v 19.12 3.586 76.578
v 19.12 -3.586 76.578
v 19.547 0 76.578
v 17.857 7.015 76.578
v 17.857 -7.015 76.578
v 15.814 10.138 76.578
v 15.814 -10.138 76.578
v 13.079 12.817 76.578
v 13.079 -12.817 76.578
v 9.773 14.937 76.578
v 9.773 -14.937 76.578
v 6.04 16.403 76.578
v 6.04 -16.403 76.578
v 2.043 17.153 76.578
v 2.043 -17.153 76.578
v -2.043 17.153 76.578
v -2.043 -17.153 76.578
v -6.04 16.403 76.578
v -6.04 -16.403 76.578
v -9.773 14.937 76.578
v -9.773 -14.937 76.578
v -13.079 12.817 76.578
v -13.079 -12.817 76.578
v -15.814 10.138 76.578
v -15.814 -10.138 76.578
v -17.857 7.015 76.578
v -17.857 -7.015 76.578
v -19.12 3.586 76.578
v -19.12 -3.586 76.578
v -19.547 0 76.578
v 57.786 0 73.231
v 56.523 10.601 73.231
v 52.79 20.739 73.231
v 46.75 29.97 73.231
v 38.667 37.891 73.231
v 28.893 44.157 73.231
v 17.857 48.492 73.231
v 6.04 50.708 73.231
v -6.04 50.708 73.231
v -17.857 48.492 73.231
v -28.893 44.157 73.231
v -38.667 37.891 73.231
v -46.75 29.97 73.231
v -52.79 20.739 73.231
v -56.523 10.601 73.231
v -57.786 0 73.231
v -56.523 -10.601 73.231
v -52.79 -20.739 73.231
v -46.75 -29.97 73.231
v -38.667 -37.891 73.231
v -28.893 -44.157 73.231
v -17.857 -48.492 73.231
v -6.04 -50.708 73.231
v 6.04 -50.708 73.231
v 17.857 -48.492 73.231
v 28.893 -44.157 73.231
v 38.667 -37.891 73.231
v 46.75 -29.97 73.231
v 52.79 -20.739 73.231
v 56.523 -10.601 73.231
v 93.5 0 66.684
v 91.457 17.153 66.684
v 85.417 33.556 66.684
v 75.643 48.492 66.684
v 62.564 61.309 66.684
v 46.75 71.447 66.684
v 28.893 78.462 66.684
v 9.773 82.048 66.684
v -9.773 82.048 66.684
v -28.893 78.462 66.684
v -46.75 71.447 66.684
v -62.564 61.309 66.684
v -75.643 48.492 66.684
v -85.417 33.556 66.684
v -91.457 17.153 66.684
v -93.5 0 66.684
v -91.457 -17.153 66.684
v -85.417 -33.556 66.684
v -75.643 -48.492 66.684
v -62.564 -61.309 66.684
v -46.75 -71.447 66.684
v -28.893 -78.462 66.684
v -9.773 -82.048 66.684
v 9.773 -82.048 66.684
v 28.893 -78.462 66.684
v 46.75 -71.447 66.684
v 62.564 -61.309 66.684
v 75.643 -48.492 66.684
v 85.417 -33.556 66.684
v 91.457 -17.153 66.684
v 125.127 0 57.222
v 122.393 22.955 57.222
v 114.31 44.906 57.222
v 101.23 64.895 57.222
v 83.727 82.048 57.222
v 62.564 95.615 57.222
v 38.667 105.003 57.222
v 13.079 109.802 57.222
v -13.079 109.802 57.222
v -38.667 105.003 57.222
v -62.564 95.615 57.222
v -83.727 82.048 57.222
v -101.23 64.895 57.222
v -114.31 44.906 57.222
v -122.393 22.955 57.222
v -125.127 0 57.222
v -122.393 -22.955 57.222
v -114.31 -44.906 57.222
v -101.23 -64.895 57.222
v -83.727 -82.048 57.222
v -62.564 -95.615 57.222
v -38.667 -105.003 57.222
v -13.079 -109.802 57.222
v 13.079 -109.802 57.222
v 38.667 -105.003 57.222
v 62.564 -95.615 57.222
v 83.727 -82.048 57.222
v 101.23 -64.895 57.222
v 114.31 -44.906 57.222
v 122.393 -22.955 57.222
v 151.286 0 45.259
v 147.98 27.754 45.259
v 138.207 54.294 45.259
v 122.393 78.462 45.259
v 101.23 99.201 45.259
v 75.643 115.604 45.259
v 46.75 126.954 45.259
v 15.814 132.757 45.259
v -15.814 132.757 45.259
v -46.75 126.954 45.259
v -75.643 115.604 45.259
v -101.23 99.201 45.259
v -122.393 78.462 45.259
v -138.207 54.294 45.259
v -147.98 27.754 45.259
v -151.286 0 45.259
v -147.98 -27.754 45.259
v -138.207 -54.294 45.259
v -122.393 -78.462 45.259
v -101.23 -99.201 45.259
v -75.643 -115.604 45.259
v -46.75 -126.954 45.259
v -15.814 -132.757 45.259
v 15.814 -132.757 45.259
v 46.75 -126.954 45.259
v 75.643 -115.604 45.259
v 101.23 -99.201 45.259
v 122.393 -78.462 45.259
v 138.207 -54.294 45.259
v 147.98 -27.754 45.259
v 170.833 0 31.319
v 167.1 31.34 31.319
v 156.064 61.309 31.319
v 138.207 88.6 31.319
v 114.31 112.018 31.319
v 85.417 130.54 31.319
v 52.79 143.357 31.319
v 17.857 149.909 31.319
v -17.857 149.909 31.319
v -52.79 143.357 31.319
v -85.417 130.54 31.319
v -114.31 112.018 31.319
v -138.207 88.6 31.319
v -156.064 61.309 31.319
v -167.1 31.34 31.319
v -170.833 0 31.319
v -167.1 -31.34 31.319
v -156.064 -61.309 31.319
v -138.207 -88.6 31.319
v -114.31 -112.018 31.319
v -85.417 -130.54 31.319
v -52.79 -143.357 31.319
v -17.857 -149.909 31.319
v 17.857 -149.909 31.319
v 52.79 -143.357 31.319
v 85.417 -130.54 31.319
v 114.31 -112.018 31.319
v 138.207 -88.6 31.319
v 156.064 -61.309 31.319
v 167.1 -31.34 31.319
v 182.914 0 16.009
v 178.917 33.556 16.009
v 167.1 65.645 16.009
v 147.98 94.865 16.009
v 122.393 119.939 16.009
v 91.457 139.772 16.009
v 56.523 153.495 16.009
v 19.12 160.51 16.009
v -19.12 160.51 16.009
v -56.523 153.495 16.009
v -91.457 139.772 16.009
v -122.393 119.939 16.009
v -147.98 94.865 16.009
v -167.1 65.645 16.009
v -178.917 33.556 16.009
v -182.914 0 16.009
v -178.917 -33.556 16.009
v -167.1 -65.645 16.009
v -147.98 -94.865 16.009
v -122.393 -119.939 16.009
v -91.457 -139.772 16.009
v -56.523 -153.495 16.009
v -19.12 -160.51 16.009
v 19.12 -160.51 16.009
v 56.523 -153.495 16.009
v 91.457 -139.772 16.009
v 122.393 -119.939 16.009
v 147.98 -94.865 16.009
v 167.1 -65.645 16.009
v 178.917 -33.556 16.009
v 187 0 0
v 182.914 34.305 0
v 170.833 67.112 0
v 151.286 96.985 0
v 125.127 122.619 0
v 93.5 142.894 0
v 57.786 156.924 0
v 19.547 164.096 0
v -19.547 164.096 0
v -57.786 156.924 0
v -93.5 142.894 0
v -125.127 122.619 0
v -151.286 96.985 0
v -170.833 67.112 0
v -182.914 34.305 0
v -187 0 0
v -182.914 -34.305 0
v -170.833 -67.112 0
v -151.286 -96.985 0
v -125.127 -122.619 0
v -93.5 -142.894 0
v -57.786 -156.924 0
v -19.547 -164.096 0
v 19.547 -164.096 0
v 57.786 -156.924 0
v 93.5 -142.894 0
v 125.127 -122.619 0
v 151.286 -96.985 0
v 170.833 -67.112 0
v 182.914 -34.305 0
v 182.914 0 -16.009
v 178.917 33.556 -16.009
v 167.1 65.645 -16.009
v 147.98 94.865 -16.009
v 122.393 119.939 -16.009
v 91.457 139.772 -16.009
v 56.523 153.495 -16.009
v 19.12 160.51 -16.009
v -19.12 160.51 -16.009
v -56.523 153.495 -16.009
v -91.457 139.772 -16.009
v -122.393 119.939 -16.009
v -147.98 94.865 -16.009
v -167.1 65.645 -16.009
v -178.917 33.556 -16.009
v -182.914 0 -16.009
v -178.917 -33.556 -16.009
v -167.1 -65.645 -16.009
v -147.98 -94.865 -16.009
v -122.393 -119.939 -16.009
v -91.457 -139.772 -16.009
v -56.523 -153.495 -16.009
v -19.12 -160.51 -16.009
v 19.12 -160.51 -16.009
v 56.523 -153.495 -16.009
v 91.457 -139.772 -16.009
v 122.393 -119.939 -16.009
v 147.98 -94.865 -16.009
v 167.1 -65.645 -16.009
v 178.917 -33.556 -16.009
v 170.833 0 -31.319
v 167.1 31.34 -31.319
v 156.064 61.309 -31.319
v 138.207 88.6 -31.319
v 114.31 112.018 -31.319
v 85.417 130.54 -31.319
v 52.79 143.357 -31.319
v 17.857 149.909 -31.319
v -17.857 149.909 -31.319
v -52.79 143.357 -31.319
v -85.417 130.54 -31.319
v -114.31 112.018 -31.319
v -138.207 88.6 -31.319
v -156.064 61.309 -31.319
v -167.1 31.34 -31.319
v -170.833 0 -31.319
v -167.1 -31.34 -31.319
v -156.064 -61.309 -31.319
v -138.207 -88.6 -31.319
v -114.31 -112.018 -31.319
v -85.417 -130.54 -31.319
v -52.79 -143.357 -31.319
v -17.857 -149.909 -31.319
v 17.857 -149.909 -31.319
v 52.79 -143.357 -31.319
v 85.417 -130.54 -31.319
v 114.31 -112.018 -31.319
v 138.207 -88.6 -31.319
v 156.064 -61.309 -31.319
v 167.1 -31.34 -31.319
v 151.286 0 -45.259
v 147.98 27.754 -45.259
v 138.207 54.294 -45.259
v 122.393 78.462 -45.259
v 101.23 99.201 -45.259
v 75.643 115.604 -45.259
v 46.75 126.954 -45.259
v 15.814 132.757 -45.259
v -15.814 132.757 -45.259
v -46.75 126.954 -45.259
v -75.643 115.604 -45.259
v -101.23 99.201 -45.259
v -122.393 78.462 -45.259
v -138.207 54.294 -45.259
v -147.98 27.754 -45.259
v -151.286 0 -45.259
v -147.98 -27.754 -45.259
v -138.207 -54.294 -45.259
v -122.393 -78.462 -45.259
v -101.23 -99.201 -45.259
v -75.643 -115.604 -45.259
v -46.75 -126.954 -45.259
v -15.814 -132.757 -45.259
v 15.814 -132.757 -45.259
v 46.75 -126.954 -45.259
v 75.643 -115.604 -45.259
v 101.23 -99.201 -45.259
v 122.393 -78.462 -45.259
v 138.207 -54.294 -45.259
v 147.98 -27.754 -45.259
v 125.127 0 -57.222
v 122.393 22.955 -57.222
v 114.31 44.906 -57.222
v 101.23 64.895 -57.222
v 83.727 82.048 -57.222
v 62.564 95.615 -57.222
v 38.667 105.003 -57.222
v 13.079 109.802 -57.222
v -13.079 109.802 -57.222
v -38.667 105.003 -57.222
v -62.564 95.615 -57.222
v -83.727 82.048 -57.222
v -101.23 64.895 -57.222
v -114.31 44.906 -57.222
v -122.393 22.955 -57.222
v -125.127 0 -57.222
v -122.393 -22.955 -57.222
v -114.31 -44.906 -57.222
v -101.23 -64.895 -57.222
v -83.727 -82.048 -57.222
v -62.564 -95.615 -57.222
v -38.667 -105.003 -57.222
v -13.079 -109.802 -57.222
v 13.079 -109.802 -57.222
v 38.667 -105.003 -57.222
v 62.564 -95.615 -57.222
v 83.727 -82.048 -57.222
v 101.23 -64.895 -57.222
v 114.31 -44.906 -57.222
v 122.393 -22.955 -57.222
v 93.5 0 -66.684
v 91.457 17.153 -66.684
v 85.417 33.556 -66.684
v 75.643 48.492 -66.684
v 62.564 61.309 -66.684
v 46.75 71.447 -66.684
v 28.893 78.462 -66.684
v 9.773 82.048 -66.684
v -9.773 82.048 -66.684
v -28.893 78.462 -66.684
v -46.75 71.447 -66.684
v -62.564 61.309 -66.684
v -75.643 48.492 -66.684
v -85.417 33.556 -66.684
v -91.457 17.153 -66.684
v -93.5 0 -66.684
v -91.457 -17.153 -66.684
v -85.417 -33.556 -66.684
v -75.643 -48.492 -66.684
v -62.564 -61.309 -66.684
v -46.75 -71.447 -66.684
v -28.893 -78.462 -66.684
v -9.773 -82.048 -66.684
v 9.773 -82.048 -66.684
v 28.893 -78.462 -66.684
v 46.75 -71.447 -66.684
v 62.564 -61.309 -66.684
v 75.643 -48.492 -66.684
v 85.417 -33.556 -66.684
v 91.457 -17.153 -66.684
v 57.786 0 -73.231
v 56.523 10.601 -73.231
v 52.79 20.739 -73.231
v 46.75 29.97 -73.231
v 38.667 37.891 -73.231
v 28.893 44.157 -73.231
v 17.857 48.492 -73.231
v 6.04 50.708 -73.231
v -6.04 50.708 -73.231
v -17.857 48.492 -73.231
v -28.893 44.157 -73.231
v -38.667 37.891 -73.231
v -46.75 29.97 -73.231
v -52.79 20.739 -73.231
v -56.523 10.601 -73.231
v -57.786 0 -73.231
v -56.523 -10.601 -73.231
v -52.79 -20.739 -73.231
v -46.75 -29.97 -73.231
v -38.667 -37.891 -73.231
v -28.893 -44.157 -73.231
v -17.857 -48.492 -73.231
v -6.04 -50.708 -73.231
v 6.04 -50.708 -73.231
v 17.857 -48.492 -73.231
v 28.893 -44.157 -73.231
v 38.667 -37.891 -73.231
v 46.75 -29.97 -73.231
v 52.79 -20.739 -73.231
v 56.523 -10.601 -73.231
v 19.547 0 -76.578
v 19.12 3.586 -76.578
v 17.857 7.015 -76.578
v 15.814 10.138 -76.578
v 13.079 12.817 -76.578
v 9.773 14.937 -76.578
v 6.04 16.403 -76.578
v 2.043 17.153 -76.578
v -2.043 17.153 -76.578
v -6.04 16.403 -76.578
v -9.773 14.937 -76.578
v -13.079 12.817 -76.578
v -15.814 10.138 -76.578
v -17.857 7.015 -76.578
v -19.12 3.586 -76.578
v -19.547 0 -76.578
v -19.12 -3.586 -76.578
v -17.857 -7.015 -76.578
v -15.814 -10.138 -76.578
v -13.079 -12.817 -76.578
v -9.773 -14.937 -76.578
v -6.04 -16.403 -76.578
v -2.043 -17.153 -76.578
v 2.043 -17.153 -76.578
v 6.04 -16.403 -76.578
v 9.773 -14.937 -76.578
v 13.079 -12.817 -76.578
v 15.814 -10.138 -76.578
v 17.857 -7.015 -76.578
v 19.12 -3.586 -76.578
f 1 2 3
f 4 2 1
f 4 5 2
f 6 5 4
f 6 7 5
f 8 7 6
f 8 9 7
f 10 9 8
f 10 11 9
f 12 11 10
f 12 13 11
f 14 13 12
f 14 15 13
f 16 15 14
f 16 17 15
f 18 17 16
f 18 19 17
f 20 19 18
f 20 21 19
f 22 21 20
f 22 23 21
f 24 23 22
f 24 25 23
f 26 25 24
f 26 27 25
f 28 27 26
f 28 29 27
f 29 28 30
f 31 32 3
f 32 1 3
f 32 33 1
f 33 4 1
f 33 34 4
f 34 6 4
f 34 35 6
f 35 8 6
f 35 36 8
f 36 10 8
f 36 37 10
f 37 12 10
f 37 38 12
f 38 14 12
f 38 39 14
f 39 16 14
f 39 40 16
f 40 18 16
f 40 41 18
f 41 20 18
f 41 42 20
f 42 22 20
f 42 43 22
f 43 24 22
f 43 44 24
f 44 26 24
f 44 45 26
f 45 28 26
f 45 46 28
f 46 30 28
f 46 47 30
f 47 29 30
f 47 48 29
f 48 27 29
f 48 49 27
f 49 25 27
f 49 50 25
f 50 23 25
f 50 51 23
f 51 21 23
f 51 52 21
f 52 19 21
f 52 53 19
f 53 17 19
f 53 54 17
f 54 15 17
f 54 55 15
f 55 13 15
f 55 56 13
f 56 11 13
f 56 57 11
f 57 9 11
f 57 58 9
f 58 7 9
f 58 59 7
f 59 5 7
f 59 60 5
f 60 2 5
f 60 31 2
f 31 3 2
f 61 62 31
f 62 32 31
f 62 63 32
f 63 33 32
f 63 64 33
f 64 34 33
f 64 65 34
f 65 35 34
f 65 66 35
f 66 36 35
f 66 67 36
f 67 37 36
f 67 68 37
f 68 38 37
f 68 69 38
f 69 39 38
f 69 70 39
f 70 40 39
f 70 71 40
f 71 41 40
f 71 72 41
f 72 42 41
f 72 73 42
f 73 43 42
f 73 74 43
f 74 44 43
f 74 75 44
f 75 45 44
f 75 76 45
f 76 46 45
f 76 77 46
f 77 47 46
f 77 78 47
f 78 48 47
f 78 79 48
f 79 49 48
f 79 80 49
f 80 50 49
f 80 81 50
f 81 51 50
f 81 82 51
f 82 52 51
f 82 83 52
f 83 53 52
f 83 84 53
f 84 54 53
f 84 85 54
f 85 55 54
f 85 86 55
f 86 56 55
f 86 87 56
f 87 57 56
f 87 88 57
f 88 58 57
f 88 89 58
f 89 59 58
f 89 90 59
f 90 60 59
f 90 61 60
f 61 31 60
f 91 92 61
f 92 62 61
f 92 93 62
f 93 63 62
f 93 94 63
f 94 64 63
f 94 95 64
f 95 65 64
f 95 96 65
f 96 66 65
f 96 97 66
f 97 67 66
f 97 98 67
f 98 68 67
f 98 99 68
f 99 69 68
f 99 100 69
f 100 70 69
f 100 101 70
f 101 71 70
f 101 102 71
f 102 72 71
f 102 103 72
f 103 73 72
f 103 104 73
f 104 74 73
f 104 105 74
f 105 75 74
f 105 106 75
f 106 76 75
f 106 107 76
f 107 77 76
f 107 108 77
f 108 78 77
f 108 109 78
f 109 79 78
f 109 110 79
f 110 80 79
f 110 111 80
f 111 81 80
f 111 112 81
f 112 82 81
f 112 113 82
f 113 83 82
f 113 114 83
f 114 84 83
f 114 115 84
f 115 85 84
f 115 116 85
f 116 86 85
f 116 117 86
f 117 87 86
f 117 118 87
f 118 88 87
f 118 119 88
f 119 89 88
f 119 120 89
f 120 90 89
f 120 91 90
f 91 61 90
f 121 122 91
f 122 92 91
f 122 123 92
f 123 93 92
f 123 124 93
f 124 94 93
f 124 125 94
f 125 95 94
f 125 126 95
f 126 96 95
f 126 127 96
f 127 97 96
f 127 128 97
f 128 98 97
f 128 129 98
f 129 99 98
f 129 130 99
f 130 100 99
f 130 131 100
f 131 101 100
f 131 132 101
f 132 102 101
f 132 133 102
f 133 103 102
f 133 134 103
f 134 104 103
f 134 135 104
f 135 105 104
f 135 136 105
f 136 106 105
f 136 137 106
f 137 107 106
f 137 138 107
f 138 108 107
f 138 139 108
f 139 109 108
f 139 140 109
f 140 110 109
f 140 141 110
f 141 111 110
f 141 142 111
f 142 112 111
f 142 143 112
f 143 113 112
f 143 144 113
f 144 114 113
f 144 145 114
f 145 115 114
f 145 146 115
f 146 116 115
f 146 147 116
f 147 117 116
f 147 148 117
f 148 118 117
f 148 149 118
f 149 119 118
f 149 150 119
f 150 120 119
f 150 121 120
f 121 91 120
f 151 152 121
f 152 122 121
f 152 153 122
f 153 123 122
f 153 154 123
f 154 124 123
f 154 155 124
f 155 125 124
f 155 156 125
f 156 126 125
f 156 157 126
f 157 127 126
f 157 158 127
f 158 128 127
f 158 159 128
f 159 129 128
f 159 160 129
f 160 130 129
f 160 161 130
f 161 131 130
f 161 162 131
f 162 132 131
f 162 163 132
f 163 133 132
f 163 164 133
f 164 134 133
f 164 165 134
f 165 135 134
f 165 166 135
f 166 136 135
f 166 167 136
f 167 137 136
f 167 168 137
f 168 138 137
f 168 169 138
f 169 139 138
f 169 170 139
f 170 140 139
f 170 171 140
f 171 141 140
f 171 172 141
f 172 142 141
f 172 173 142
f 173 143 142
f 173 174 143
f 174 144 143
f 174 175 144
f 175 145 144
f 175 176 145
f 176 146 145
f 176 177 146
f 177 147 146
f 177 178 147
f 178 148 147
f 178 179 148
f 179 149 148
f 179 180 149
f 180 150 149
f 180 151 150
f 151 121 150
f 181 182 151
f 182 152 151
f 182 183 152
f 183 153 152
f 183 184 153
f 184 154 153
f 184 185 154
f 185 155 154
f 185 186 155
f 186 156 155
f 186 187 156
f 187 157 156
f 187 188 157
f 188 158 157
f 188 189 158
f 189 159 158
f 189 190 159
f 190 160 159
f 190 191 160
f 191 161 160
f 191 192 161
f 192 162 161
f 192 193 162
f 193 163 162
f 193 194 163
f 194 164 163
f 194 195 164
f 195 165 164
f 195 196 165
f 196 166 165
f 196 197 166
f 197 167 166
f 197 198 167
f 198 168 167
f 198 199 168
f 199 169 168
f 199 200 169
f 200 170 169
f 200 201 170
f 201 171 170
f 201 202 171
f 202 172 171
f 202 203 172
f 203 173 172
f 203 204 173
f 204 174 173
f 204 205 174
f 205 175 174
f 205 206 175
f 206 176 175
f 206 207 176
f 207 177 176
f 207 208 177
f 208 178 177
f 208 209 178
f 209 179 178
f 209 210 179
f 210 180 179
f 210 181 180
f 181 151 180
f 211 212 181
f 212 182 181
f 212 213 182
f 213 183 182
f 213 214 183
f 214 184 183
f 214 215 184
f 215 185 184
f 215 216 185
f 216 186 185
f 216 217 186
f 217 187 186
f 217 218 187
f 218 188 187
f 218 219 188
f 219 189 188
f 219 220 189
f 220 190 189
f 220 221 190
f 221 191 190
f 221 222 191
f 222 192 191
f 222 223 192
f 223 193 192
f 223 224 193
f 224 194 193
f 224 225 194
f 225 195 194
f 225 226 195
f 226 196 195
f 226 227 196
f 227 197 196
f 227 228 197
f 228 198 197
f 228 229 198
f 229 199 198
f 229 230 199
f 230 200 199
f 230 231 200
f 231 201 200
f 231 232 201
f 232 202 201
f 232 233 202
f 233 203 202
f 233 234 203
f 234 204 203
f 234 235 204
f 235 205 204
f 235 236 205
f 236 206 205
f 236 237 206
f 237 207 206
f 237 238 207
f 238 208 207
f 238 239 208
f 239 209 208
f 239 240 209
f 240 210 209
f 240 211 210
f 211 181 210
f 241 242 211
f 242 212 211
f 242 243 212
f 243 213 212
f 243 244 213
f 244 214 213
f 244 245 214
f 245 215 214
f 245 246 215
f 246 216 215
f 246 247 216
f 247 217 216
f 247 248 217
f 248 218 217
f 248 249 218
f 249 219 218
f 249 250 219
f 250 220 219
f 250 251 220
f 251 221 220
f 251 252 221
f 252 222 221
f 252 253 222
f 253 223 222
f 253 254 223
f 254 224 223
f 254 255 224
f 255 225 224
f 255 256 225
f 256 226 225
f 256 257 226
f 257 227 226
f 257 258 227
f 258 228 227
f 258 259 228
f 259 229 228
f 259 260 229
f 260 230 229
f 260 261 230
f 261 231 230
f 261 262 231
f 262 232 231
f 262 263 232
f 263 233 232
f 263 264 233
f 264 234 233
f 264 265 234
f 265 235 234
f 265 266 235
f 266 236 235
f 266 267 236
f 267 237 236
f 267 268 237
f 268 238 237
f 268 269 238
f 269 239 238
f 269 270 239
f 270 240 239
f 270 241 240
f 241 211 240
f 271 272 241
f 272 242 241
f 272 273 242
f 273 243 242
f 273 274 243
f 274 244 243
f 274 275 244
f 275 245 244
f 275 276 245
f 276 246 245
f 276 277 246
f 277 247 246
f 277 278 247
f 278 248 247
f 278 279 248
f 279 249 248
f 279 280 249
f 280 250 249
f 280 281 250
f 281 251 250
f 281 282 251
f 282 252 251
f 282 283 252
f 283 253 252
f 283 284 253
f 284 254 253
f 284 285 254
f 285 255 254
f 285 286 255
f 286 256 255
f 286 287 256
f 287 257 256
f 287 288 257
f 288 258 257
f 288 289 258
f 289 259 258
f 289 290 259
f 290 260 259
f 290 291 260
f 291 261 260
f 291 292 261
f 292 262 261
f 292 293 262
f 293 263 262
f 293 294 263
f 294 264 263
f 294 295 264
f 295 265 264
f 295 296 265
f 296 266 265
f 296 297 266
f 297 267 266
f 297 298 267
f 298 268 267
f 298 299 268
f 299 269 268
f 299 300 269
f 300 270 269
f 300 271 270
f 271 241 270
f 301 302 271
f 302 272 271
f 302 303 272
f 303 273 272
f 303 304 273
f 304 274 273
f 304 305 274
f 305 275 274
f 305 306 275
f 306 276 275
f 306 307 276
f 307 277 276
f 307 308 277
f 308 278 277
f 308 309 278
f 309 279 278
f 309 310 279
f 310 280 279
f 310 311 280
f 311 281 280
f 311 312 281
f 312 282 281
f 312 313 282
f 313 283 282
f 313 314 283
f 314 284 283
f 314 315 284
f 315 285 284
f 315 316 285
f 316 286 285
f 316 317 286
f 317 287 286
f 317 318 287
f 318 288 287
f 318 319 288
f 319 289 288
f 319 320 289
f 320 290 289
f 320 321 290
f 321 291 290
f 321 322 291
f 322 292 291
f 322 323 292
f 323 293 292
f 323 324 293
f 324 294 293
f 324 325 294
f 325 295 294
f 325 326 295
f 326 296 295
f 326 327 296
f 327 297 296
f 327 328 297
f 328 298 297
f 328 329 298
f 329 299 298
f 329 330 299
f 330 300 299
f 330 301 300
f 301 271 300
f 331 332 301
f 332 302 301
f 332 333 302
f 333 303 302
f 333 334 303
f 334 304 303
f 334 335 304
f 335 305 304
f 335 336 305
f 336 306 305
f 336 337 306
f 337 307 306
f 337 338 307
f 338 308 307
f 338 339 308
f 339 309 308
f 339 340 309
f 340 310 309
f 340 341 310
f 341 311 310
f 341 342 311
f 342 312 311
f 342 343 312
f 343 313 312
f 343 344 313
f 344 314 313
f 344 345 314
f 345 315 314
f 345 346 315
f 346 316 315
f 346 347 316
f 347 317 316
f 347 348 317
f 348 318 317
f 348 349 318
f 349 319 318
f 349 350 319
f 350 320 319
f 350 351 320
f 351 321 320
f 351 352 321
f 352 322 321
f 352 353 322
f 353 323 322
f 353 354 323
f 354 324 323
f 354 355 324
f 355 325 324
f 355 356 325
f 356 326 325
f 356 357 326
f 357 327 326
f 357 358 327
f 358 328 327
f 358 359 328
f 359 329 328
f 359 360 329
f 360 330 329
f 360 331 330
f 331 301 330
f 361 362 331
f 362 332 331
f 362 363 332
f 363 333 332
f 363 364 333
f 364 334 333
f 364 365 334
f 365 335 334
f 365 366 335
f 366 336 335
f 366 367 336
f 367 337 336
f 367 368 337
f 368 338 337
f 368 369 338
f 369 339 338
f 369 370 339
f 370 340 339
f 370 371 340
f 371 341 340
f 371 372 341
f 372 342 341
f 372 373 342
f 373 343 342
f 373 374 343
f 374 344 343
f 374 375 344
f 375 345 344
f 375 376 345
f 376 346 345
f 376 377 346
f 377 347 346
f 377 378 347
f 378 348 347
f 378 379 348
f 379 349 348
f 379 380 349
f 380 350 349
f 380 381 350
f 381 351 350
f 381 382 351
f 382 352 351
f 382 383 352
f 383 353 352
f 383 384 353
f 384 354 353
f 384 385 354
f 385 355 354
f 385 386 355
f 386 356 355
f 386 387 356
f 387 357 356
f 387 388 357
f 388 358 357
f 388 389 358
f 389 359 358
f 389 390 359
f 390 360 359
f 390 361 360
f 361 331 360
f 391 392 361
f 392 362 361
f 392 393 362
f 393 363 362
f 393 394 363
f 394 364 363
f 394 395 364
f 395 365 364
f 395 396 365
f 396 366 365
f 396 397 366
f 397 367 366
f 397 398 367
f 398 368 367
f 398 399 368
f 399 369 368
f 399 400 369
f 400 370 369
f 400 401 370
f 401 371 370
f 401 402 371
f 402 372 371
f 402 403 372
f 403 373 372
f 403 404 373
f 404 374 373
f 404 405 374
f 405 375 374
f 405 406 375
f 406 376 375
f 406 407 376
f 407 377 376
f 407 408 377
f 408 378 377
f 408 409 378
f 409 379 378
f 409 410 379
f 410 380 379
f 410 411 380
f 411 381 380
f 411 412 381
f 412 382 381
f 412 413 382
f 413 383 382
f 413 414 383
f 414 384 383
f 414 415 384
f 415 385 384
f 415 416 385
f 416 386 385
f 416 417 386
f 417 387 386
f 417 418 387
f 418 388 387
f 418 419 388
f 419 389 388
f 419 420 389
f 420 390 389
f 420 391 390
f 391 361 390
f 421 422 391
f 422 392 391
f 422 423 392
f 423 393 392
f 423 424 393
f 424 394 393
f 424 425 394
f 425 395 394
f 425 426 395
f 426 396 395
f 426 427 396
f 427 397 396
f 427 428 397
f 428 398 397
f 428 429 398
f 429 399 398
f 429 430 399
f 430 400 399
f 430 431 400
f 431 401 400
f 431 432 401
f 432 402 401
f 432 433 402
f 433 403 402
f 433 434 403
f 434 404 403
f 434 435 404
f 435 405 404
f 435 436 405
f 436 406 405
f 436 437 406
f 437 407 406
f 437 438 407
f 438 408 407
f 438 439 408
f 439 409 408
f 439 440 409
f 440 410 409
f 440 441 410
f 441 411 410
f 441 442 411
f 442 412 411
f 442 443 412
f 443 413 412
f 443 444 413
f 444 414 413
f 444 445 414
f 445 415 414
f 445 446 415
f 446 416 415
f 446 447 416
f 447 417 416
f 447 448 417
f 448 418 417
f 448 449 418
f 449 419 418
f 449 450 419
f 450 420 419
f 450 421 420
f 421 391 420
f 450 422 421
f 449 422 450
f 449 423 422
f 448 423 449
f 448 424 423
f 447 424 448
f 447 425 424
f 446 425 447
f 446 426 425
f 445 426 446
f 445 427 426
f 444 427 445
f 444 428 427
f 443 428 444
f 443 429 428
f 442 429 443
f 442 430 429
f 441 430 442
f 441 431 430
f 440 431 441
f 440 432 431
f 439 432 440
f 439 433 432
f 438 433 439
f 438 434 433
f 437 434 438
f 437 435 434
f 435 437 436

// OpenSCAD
// Generated by SolidPython 1.0.1 on 2020-07-29 00:46:53


scale(v = [17, 15, 7]) {
	sphere(r = 11);
}
/***********************************************
*********      SolidPython code:      **********
************************************************
 
# import packages: SolidPython
from solid import *
from solid.utils import *
from itertools import chain, combinations, permutations


class Resize:

    def __init__(self, scad_file):
        self.scad_file = scad_file
        #self.scad_file = import_scad(scad_file)
        # cone/cylinder param:
        self.r1 = 0
        self.r2 = 0
        self.h = 0
        # rectangular prism param:
        self.w = 0
        self.l = 0
        # ellipse param:
        self.r = 0

    # import OpenScad code (file name corresponds to shape)


    # classify shape + parameters
    def assign(self, param1, param2, param3):
        if self.scad_file == 'cone.scad':
            self.r1 = param1
            self.r2 = param2
            self.h = param3
        elif self.scad_file == 'cylinder.scad':
            self.r1 = param1
            self.r2 = param2
            self.h = param3
        elif self.scad_file == 'rectangularPrism.scad':
            self.h = param1
            self.l = param2
            self.w = param3
        else:
            self.r = param1
            self.h = param2

    # resize parameters
    def iterate(self):
        x = range(3, 20, 2)
        i = 1
        if self.scad_file == 'cone.scad':
            tempList = list(permutations(x, 2))
            for temp in tempList:
                param1 = temp[0]
                param2 = temp[1]
                filepath = 'produced_scad_files/' + 'cone' + str(param1) + '_' + str(param2) + '_' + '.scad'
                scad_render_to_file(cylinder(h=param1, r1=param2, r2=0), filepath)

        elif self.scad_file == 'cylinder.scad':
            tempList = list(permutations(x, 3))
            for temp in tempList:
                param1 = temp[0]
                param2 = temp[1]
                filepath = 'produced_scad_files/' + 'cylinder' + str(param1) + '_' + str(param2) + '_' + '.scad'
                scad_render_to_file(cylinder(h=param1, r1=param2, r2=param2), filepath)

        elif self.scad_file == 'rectangularPrism.scad':
            tempList = list(permutations(x, 3))
            for temp in tempList:
                param1 = temp[0]
                param2 = temp[1]
                param3 = temp[2]
                filepath = 'produced_scad_files/' + 'rectangularPrism' + str(param1) + '_' + str(param2) + '_' + str(
                    param3) + '.scad'
                scad_render_to_file(cube(size=(param1, param2, param3)), filepath)

        elif self.scad_file == 'ellipse.scad':
            tempList = list(permutations(x, 4))
            for temp in tempList:
                param1 = temp[0]
                param2 = temp[1]
                param3 = temp[2]
                param4 = temp[3]
                filepath = 'produced_scad_files/' + 'ellipse' + str(param1) + '_' + str(param2) + '_' + str(param3) + '_' + str(param4) + '.scad'
                scad_render_to_file(scale([param1, param2, param3])(sphere(r=param4)), filepath)

    def render_to_scadfile(self):
        scad_render_to_file(scad, 'example.scad') 
 
************************************************/
